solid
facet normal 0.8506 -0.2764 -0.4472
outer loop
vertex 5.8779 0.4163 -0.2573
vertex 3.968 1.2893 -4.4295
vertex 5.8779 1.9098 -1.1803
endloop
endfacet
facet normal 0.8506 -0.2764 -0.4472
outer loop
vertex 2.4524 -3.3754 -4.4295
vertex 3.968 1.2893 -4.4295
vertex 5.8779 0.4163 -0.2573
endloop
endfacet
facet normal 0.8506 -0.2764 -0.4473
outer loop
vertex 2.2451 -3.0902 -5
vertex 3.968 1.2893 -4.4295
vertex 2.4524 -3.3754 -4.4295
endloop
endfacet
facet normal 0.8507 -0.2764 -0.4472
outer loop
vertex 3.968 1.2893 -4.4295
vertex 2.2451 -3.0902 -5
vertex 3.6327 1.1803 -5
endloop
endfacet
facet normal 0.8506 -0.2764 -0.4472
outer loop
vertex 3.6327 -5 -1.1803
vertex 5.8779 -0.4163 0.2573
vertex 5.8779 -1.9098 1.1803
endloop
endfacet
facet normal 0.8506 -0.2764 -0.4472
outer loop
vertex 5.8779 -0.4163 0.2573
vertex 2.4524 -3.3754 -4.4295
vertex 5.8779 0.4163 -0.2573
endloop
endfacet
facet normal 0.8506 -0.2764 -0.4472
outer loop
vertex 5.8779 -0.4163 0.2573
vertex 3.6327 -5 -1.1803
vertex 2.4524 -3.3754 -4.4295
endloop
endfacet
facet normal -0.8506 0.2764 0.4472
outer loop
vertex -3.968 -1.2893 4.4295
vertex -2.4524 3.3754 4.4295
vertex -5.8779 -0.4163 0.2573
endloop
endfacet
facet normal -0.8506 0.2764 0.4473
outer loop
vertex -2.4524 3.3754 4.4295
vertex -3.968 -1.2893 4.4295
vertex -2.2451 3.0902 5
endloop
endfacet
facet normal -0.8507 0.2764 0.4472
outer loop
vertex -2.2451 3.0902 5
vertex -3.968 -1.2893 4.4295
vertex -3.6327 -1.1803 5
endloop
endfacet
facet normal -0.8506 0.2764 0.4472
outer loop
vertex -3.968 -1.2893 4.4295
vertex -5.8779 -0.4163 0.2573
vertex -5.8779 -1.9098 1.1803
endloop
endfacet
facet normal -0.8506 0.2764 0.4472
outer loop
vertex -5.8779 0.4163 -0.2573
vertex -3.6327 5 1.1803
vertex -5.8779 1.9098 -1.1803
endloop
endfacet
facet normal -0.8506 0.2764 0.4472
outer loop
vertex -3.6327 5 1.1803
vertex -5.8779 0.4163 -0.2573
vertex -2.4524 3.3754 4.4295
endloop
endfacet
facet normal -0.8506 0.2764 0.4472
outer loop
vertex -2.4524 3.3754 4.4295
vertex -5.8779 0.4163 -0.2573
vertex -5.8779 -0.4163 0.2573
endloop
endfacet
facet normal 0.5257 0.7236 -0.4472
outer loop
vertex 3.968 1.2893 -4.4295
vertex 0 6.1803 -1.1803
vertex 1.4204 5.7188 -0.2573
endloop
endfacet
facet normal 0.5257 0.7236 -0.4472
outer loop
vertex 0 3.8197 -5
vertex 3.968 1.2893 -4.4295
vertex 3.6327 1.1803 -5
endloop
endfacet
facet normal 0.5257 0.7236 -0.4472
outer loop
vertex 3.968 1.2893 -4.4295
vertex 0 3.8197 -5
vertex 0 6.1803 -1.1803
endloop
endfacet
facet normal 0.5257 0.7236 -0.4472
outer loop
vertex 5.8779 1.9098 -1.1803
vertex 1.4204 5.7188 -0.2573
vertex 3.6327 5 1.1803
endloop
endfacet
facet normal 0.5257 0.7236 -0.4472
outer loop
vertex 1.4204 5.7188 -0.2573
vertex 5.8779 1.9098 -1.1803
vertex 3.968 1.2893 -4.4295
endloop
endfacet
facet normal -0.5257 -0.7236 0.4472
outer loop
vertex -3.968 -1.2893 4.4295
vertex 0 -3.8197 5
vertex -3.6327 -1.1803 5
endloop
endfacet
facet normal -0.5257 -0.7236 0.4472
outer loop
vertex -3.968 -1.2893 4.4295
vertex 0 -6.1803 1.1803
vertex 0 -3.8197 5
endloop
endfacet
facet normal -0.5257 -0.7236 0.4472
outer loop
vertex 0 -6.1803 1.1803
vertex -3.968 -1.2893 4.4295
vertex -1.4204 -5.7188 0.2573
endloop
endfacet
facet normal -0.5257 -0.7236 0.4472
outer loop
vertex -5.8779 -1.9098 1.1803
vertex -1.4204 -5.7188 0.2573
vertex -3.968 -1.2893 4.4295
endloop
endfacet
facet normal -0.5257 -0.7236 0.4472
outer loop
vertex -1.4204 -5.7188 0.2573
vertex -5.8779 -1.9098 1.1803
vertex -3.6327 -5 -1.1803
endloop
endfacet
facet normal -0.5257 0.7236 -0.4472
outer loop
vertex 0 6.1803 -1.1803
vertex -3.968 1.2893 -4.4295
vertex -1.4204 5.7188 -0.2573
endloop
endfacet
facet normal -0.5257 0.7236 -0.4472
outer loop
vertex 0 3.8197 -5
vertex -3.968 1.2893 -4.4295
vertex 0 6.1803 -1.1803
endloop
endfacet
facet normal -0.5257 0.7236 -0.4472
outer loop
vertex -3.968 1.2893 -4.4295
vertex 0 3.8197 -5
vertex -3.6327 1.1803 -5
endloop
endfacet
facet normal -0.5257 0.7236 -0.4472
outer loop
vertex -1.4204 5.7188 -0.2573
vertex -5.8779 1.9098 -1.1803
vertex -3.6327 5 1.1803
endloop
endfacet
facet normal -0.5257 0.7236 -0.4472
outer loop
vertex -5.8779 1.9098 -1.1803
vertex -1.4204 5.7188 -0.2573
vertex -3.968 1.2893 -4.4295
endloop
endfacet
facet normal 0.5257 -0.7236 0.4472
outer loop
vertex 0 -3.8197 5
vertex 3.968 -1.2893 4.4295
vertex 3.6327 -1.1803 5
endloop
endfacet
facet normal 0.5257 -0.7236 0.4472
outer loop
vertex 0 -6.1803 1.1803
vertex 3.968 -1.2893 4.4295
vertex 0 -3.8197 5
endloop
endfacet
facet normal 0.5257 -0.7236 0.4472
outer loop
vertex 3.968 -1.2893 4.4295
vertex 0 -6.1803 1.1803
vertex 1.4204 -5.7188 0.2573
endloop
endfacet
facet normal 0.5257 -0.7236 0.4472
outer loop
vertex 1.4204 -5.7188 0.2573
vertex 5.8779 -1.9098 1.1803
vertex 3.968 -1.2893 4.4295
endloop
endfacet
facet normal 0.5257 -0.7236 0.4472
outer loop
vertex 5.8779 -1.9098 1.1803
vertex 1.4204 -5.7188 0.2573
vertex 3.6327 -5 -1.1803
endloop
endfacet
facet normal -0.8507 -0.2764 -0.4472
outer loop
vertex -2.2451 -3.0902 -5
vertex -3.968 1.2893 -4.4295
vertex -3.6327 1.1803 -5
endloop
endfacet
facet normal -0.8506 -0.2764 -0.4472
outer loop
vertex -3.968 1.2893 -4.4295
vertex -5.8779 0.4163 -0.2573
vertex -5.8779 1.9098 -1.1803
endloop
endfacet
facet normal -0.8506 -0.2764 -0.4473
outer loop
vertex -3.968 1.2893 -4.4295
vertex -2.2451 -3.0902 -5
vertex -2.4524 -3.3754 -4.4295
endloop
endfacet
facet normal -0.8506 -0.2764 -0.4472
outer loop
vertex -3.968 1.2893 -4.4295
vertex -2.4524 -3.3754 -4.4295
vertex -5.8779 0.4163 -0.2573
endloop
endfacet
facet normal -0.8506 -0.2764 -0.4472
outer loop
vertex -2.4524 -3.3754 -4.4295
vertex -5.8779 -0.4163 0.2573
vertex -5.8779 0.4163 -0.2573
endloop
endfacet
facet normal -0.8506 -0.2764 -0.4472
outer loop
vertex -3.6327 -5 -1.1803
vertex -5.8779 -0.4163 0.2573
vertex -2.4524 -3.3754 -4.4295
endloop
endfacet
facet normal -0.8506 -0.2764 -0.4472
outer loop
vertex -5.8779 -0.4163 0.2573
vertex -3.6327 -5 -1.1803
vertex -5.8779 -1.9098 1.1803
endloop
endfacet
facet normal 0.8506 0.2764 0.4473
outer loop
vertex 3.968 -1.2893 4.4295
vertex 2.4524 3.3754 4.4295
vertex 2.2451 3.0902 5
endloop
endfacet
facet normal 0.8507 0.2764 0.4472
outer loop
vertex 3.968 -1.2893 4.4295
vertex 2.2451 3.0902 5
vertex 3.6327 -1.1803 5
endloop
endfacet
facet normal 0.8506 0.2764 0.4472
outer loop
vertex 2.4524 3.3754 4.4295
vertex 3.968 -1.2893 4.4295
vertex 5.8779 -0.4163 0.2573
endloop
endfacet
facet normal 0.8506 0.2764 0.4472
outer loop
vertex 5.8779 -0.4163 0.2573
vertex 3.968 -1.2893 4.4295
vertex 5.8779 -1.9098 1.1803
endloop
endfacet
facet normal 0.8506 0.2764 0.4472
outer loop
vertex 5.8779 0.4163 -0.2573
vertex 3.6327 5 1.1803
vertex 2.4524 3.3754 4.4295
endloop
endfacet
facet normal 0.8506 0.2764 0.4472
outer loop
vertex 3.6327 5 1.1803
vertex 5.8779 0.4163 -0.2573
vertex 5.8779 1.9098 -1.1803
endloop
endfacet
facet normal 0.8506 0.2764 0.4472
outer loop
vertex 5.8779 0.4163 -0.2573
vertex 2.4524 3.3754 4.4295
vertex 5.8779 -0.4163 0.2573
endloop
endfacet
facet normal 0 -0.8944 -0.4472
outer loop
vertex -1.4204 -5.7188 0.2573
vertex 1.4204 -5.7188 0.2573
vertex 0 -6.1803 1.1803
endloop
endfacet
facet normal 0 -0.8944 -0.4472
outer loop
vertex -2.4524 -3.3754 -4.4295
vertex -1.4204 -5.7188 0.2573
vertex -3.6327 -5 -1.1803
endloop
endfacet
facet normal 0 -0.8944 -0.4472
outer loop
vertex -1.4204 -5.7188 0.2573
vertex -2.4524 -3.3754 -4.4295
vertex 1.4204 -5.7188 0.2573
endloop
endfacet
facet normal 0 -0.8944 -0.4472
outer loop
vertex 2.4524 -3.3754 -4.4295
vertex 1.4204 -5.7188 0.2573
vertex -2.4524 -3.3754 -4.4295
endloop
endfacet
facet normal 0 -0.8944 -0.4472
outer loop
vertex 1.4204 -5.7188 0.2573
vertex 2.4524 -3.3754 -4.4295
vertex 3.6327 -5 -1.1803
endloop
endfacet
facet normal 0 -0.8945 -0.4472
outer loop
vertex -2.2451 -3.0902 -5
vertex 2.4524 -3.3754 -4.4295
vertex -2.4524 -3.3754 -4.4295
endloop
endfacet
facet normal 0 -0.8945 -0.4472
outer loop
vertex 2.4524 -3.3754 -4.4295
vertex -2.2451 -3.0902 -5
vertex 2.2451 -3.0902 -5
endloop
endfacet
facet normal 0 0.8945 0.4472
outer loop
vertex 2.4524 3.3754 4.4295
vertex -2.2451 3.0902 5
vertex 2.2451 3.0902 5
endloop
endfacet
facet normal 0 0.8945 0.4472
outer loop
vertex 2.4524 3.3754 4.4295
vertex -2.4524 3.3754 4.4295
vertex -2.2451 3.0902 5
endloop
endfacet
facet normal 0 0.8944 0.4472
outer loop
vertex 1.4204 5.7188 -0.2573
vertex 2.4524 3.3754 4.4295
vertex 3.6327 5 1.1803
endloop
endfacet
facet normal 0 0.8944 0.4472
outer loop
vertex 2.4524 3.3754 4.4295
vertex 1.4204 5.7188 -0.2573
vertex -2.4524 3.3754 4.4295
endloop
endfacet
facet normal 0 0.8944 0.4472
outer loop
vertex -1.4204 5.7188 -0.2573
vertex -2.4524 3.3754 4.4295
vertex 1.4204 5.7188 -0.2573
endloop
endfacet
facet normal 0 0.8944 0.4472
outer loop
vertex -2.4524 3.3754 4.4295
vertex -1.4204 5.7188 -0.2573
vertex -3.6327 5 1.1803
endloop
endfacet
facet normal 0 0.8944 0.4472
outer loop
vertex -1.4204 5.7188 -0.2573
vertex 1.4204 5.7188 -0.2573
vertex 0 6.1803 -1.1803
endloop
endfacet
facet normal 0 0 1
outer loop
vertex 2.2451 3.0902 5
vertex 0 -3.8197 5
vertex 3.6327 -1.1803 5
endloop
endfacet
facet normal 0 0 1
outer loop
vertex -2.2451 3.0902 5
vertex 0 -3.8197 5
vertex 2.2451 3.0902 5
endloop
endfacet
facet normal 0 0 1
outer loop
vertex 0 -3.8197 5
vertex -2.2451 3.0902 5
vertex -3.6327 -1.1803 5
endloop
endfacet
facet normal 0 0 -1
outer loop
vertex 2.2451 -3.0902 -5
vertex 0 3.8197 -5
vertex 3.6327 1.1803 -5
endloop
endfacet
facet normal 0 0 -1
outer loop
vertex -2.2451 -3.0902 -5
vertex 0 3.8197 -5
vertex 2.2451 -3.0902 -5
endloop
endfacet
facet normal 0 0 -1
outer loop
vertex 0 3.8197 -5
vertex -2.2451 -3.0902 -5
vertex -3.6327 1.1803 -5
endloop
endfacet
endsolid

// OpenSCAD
module box() {
    cube([2,2,1], center = true); 
}

module dodecahedron() {
      dihedral = 116.565;
      intersection(){
            box();
            intersection_for(i=[1:5])  { 
                rotate([dihedral, 0, 360 / 5 * i])  box(); 
           }
      }
}

scale(10) dodecahedron();
